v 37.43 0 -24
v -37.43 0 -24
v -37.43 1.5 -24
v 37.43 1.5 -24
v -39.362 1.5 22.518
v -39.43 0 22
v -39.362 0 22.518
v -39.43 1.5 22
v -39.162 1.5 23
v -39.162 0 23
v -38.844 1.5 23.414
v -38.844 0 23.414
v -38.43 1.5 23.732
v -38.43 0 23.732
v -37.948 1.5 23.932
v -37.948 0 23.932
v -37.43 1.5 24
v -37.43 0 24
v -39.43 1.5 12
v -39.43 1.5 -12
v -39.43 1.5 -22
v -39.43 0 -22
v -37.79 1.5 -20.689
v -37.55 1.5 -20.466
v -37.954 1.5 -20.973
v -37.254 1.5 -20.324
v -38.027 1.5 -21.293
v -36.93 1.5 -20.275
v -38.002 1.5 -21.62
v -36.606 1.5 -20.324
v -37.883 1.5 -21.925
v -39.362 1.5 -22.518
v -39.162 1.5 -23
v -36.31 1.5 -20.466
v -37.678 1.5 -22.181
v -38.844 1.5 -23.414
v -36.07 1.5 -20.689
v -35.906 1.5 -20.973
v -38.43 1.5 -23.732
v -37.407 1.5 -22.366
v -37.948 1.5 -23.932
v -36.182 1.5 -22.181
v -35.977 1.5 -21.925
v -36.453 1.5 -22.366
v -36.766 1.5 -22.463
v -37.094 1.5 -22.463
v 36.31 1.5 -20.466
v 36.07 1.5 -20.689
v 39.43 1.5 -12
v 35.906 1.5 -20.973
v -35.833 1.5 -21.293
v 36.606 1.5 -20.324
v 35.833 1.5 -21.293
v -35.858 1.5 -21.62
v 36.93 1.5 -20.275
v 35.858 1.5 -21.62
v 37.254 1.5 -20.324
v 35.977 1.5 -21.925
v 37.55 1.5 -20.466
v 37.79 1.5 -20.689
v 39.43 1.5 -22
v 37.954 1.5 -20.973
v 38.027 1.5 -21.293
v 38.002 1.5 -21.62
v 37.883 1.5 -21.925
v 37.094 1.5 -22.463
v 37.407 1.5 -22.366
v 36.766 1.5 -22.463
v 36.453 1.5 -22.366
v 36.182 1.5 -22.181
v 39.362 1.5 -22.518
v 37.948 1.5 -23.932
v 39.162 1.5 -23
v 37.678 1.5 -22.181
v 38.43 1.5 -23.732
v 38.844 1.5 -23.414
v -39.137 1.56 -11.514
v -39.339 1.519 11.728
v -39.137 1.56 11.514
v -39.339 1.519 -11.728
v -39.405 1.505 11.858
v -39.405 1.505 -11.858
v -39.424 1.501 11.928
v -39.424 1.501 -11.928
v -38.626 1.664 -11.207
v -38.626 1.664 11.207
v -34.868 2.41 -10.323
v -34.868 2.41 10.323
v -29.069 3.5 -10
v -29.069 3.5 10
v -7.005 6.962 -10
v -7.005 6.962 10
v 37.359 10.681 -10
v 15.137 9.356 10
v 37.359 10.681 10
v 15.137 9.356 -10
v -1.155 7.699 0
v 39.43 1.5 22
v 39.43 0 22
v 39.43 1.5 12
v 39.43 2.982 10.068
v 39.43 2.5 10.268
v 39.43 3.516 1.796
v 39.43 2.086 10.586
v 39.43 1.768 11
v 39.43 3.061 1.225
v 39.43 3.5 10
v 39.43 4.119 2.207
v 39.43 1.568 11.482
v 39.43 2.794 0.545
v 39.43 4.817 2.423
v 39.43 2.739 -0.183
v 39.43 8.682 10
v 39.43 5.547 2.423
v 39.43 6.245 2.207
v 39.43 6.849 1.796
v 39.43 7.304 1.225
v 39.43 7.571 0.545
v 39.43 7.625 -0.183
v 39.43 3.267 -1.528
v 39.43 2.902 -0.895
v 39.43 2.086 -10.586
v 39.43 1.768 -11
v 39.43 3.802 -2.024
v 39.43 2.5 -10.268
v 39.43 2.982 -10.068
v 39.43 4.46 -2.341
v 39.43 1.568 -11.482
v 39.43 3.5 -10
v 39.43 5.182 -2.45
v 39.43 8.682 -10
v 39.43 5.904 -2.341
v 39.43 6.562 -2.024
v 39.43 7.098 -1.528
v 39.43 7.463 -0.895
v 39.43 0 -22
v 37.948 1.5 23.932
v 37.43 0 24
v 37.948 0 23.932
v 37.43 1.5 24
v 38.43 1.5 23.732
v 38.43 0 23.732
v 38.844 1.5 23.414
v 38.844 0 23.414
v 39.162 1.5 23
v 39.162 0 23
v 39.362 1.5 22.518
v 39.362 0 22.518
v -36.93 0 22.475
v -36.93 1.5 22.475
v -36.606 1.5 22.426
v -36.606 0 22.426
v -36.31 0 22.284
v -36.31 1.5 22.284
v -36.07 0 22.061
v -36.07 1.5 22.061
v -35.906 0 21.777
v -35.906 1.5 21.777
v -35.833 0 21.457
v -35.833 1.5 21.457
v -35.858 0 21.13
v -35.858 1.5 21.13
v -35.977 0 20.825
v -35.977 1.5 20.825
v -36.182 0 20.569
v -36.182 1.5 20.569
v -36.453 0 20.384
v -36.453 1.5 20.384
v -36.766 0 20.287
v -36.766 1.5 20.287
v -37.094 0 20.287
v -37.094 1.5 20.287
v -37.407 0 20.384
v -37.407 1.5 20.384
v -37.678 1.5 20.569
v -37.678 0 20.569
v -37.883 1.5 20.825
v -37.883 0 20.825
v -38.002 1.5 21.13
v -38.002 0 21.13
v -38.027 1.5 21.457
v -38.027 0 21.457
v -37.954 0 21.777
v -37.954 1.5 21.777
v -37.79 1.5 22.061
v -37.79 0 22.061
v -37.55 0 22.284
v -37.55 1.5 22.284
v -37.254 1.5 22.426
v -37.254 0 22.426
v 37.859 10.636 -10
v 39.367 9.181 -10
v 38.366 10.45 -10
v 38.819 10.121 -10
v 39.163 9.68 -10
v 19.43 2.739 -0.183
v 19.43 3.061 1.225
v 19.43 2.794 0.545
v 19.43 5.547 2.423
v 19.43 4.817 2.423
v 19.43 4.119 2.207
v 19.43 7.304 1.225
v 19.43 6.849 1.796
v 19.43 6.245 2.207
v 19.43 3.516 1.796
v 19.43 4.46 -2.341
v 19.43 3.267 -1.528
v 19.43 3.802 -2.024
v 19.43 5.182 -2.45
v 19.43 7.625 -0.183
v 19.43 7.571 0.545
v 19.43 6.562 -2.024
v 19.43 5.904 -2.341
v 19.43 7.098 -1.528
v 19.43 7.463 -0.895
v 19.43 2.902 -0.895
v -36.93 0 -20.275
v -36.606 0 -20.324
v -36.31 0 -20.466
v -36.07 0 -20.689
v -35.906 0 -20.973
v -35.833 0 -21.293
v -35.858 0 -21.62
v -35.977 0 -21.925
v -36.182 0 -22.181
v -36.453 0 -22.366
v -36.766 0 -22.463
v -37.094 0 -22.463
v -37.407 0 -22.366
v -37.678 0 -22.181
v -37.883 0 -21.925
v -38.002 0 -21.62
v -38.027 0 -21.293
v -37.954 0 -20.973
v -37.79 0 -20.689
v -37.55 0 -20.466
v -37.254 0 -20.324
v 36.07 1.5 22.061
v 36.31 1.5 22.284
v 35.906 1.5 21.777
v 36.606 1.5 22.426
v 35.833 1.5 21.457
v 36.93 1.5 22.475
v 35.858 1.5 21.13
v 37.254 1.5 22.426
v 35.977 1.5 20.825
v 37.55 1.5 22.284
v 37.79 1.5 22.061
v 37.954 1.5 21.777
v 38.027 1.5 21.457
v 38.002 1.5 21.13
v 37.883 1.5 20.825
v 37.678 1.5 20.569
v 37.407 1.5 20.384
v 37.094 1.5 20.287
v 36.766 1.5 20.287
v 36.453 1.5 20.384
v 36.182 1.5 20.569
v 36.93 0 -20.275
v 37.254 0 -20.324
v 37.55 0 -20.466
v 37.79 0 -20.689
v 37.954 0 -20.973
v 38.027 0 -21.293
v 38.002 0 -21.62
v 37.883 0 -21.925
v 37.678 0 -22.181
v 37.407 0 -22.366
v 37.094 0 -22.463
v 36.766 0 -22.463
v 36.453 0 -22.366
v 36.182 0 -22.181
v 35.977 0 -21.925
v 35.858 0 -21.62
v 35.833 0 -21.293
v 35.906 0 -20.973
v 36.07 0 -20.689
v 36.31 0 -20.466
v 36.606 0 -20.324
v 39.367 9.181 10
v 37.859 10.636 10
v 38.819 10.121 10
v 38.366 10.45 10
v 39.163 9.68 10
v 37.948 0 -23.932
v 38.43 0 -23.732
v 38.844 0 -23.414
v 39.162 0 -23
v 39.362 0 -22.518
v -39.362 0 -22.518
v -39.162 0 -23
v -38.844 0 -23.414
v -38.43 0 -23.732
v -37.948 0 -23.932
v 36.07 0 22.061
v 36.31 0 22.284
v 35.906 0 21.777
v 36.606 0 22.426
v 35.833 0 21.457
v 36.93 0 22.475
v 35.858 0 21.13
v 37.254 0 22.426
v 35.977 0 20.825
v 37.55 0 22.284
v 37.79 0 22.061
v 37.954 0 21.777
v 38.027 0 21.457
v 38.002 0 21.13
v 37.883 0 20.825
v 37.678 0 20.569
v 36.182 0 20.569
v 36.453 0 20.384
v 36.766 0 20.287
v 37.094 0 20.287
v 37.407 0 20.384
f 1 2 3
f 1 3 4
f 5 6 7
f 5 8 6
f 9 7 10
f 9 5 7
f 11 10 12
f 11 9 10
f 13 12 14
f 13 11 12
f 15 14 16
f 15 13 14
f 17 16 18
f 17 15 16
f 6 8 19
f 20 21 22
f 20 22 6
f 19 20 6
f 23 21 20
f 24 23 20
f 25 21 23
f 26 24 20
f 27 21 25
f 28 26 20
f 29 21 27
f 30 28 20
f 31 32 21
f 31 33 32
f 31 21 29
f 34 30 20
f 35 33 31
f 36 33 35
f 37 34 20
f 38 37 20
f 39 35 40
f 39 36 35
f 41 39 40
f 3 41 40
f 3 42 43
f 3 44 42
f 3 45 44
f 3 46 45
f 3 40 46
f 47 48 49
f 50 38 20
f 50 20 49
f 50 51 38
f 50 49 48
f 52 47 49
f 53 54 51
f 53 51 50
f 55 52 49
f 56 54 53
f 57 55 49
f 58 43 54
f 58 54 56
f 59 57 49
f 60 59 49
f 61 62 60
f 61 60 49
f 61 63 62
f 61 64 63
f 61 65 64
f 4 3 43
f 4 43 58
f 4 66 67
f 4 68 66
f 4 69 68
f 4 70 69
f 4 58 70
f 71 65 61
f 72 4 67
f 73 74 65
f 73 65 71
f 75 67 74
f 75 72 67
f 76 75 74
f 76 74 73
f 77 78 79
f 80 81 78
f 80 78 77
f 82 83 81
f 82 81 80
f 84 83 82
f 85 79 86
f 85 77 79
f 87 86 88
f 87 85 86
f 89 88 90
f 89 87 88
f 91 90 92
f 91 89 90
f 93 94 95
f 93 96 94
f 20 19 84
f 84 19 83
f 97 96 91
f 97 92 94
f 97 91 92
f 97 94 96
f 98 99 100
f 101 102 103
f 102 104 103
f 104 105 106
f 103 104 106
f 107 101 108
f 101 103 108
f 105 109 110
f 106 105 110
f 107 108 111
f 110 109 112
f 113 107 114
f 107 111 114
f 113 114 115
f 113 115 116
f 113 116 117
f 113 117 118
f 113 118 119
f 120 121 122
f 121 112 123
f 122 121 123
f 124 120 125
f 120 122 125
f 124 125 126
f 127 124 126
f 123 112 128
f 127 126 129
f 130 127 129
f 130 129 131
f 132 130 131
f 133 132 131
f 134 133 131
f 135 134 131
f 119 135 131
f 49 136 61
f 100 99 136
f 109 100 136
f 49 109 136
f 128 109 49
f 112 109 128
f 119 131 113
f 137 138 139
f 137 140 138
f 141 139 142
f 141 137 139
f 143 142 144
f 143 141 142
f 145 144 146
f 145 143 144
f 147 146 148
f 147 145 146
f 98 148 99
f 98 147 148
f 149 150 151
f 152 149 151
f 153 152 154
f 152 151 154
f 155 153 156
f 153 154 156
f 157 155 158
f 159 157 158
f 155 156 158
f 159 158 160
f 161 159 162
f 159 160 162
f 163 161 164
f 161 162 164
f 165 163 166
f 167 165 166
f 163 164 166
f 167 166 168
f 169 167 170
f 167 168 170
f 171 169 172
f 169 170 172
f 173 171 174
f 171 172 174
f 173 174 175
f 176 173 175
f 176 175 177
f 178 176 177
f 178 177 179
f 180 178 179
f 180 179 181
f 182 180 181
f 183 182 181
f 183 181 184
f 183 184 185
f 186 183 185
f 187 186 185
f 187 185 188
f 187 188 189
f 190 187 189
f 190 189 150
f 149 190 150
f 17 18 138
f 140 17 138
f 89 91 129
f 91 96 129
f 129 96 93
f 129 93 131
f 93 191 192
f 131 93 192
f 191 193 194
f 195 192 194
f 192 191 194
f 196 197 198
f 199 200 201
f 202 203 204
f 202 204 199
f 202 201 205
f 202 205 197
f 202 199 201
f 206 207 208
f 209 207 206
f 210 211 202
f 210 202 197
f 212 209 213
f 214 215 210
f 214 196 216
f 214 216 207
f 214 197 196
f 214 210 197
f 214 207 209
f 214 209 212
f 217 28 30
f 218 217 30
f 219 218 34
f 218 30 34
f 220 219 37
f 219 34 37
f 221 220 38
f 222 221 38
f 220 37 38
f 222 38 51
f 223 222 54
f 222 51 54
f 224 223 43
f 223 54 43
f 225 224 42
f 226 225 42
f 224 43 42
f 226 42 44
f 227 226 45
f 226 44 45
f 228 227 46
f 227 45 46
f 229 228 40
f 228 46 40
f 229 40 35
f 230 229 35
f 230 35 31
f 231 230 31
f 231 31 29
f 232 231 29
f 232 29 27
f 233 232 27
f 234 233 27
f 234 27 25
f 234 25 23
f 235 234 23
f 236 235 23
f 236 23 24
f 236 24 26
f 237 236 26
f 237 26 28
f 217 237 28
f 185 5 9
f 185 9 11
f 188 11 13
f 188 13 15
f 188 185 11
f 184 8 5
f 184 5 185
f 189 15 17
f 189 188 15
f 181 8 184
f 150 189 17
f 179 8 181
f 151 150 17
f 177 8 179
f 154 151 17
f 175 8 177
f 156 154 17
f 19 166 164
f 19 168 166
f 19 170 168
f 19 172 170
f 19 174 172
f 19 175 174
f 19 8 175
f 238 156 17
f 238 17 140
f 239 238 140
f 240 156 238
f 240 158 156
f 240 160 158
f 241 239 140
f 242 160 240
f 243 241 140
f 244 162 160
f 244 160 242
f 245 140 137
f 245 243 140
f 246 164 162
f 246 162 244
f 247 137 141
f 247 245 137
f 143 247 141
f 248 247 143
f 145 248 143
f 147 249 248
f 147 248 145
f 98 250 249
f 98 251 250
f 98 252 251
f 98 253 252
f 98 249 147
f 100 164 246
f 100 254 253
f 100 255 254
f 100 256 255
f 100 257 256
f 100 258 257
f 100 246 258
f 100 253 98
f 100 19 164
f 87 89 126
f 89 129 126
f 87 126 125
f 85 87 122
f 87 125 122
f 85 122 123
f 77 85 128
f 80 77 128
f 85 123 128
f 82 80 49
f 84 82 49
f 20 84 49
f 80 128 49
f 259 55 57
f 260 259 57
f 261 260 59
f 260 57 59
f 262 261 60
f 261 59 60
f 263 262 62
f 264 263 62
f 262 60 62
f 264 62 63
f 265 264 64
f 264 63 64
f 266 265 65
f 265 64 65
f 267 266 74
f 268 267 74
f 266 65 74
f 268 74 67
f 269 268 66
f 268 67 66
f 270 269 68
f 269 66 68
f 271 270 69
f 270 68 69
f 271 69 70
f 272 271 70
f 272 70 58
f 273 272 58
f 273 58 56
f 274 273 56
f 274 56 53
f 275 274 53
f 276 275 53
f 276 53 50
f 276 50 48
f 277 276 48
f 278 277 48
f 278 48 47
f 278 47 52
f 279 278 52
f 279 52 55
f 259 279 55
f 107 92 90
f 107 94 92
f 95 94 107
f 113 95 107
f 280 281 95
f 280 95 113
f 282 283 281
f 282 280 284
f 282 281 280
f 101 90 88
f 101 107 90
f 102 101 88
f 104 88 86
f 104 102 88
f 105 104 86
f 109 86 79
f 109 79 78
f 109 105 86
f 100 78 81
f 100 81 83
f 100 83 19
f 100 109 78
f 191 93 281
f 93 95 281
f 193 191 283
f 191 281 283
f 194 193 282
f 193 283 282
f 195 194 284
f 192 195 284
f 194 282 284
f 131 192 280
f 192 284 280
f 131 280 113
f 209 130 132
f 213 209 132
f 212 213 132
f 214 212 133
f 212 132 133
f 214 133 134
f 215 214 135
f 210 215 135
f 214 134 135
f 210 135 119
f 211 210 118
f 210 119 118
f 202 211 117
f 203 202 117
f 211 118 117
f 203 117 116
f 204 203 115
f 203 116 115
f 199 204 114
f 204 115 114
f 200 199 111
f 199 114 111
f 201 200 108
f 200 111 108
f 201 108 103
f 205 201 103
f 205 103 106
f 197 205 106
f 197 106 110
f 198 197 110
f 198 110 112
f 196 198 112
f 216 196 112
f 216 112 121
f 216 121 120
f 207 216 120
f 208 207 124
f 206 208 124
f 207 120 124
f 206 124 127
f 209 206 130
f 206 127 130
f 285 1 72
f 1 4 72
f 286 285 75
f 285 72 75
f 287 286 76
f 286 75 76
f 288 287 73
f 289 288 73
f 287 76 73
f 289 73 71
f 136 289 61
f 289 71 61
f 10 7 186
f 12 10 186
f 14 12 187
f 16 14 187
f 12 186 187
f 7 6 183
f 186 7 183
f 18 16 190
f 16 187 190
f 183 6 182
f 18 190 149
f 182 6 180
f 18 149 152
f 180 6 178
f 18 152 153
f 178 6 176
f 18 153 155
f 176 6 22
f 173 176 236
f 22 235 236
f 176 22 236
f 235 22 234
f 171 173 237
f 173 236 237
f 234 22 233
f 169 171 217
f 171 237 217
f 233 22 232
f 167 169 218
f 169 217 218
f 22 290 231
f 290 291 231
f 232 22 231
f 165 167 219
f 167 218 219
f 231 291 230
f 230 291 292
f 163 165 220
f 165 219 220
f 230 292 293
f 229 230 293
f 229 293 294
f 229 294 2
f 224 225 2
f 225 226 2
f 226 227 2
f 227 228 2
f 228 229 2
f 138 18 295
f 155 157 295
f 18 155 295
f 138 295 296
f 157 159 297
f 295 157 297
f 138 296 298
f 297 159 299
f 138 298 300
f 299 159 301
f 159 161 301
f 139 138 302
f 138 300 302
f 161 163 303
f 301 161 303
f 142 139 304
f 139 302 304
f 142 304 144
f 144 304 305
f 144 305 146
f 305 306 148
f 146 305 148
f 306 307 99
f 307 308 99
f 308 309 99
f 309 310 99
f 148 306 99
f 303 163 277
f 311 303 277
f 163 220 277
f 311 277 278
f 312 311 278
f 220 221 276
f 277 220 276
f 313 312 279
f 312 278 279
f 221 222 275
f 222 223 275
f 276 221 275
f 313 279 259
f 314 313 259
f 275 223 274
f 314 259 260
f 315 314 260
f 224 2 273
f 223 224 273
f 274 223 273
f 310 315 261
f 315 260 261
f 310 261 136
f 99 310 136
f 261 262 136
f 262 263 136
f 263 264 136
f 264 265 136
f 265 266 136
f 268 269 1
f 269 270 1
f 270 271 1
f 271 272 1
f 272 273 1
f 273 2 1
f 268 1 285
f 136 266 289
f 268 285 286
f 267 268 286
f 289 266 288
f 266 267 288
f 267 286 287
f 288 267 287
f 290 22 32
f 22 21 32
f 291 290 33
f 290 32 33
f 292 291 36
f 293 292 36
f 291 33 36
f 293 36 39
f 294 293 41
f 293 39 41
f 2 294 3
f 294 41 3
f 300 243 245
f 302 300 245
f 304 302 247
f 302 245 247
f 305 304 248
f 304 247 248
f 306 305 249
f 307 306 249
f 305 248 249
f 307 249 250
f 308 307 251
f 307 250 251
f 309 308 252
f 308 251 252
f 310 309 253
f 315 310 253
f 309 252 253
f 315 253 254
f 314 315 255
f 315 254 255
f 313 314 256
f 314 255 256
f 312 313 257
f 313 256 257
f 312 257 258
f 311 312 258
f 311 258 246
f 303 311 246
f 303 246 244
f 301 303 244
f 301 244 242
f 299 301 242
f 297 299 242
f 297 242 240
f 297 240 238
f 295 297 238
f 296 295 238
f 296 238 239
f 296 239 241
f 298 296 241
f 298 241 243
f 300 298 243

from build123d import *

# Parameters (mm, degrees)
SKETCH1_W                = 78.86
SKETCH1_H                = 48
BOSS_EXTRUDE1_DEPTH      = 1.5
CUT_EXTRUDE1_REACH       = 48.184
SKETCH2_R                = 1.1
FILLET1_R                = 2
BOSS_EXTRUDE2_DEPTH      = 10
BOSS_EXTRUDE2_DEPTH_BACK = 10
FILLET3_R                = 2
FILLET5_R                = 2
SKETCH4_R                = 2.45
CUT_EXTRUDE2_DEPTH       = 20


with BuildPart() as part:
    # Sketch1 → Boss-Extrude1 (new body)
    with BuildSketch(Plane(origin=(0, 0, 0), x_dir=(1, 0, 0), z_dir=(0, 1, 0))):
        Rectangle(SKETCH1_W, SKETCH1_H)
    extrude(amount=BOSS_EXTRUDE1_DEPTH)

    # Sketch2 → Cut-Extrude1 (cut, up to next)
    with BuildSketch(Plane(origin=(0, 1.5, 0), x_dir=(1, 0, 0), z_dir=(0, 1, 0)), mode=Mode.PRIVATE) as cut_extrude1_sk1:
        with Locations(Location((-36.93, 21.375, 0), (0, 0, 270))):
            Circle(SKETCH2_R)
    cut_extrude1_tool1 = extrude(cut_extrude1_sk1.sketch, amount=-CUT_EXTRUDE1_REACH, mode=Mode.PRIVATE) & part.part
    # Sketch2 → Cut-Extrude1 (cut, up to next)
    with BuildSketch(Plane(origin=(0, 1.5, 0), x_dir=(1, 0, 0), z_dir=(0, 1, 0)), mode=Mode.PRIVATE) as cut_extrude1_sk2:
        with Locations(Location((-36.93, -21.375, 0), (0, 0, 270))):
            Circle(SKETCH2_R)
    cut_extrude1_tool2 = extrude(cut_extrude1_sk2.sketch, amount=-CUT_EXTRUDE1_REACH, mode=Mode.PRIVATE) & part.part
    # Sketch2 → Cut-Extrude1 (cut, up to next)
    with BuildSketch(Plane(origin=(0, 1.5, 0), x_dir=(1, 0, 0), z_dir=(0, 1, 0)), mode=Mode.PRIVATE) as cut_extrude1_sk3:
        with Locations(Location((36.93, 21.375, 0), (0, 0, 270))):
            Circle(SKETCH2_R)
    cut_extrude1_tool3 = extrude(cut_extrude1_sk3.sketch, amount=-CUT_EXTRUDE1_REACH, mode=Mode.PRIVATE) & part.part
    # Sketch2 → Cut-Extrude1 (cut, up to next)
    with BuildSketch(Plane(origin=(0, 1.5, 0), x_dir=(1, 0, 0), z_dir=(0, 1, 0)), mode=Mode.PRIVATE) as cut_extrude1_sk4:
        with Locations(Location((36.93, -21.375, 0), (0, 0, 270))):
            Circle(SKETCH2_R)
    cut_extrude1_tool4 = extrude(cut_extrude1_sk4.sketch, amount=-CUT_EXTRUDE1_REACH, mode=Mode.PRIVATE) & part.part
    add(cut_extrude1_tool1.solids().sort_by_distance((-36.93, 1.5, -21.375))[0], mode=Mode.SUBTRACT)
    add(cut_extrude1_tool2.solids().sort_by_distance((-36.93, 1.5, 21.375))[0], mode=Mode.SUBTRACT)
    add(cut_extrude1_tool3.solids().sort_by_distance((36.93, 1.5, -21.375))[0], mode=Mode.SUBTRACT)
    add(cut_extrude1_tool4.solids().sort_by_distance((36.93, 1.5, 21.375))[0], mode=Mode.SUBTRACT)

    # Fillet1
    fillet1_edges = [part.edges().sort_by_distance(p)[0] for p in [
        (-39.43, 0.75, -24),
        (39.43, 0.75, -24),
        (39.43, 0.75, 24),
        (-39.43, 0.75, 24),
    ]]
    fillet(fillet1_edges, radius=FILLET1_R)

    # Sketch3 → Boss-Extrude2 (add, two sides: drawn at the far end of the back side and taken through both)
    with BuildSketch(Plane.XY.offset(-BOSS_EXTRUDE2_DEPTH_BACK)):
        with BuildLine():
            Line((39.43, 0.75), (39.43, 10.75))
            add(Edge.make_bspline(
                [(-39.43, 1.5), (-0.251175804, 9.517193524), (39.43, 10.75)],
                knots=[0, 0, 0, 1, 1, 1], degree=2))
            Line((-39.43, 1.5), (-39.43, 0.75))
            Line((-39.43, 0.75), (39.43, 0.75))
        make_face()
    extrude(amount=BOSS_EXTRUDE2_DEPTH + BOSS_EXTRUDE2_DEPTH_BACK)

    # Fillet3
    fillet3_edges = [part.edges().sort_by_distance(p)[0] for p in [
        (0, 1.5, 10),
        (0, 1.5, -10),
    ]]
    fillet(fillet3_edges, radius=FILLET3_R)

    # Fillet5
    fillet5_edges = [part.edges().sort_by_distance(p)[0] for p in [
        (39.43, 10.75, -5),
    ]]
    fillet(fillet5_edges, radius=FILLET5_R)

    # Sketch4 → Cut-Extrude2 (cut)
    with BuildSketch(Plane(origin=(39.43, 0, 0), x_dir=(0, 0, -1), z_dir=(1, 0, 0))):
        with Locations((0, 5.182287096)):
            Circle(SKETCH4_R)
    extrude(amount=-CUT_EXTRUDE2_DEPTH, mode=Mode.SUBTRACT)


solid = part.part
